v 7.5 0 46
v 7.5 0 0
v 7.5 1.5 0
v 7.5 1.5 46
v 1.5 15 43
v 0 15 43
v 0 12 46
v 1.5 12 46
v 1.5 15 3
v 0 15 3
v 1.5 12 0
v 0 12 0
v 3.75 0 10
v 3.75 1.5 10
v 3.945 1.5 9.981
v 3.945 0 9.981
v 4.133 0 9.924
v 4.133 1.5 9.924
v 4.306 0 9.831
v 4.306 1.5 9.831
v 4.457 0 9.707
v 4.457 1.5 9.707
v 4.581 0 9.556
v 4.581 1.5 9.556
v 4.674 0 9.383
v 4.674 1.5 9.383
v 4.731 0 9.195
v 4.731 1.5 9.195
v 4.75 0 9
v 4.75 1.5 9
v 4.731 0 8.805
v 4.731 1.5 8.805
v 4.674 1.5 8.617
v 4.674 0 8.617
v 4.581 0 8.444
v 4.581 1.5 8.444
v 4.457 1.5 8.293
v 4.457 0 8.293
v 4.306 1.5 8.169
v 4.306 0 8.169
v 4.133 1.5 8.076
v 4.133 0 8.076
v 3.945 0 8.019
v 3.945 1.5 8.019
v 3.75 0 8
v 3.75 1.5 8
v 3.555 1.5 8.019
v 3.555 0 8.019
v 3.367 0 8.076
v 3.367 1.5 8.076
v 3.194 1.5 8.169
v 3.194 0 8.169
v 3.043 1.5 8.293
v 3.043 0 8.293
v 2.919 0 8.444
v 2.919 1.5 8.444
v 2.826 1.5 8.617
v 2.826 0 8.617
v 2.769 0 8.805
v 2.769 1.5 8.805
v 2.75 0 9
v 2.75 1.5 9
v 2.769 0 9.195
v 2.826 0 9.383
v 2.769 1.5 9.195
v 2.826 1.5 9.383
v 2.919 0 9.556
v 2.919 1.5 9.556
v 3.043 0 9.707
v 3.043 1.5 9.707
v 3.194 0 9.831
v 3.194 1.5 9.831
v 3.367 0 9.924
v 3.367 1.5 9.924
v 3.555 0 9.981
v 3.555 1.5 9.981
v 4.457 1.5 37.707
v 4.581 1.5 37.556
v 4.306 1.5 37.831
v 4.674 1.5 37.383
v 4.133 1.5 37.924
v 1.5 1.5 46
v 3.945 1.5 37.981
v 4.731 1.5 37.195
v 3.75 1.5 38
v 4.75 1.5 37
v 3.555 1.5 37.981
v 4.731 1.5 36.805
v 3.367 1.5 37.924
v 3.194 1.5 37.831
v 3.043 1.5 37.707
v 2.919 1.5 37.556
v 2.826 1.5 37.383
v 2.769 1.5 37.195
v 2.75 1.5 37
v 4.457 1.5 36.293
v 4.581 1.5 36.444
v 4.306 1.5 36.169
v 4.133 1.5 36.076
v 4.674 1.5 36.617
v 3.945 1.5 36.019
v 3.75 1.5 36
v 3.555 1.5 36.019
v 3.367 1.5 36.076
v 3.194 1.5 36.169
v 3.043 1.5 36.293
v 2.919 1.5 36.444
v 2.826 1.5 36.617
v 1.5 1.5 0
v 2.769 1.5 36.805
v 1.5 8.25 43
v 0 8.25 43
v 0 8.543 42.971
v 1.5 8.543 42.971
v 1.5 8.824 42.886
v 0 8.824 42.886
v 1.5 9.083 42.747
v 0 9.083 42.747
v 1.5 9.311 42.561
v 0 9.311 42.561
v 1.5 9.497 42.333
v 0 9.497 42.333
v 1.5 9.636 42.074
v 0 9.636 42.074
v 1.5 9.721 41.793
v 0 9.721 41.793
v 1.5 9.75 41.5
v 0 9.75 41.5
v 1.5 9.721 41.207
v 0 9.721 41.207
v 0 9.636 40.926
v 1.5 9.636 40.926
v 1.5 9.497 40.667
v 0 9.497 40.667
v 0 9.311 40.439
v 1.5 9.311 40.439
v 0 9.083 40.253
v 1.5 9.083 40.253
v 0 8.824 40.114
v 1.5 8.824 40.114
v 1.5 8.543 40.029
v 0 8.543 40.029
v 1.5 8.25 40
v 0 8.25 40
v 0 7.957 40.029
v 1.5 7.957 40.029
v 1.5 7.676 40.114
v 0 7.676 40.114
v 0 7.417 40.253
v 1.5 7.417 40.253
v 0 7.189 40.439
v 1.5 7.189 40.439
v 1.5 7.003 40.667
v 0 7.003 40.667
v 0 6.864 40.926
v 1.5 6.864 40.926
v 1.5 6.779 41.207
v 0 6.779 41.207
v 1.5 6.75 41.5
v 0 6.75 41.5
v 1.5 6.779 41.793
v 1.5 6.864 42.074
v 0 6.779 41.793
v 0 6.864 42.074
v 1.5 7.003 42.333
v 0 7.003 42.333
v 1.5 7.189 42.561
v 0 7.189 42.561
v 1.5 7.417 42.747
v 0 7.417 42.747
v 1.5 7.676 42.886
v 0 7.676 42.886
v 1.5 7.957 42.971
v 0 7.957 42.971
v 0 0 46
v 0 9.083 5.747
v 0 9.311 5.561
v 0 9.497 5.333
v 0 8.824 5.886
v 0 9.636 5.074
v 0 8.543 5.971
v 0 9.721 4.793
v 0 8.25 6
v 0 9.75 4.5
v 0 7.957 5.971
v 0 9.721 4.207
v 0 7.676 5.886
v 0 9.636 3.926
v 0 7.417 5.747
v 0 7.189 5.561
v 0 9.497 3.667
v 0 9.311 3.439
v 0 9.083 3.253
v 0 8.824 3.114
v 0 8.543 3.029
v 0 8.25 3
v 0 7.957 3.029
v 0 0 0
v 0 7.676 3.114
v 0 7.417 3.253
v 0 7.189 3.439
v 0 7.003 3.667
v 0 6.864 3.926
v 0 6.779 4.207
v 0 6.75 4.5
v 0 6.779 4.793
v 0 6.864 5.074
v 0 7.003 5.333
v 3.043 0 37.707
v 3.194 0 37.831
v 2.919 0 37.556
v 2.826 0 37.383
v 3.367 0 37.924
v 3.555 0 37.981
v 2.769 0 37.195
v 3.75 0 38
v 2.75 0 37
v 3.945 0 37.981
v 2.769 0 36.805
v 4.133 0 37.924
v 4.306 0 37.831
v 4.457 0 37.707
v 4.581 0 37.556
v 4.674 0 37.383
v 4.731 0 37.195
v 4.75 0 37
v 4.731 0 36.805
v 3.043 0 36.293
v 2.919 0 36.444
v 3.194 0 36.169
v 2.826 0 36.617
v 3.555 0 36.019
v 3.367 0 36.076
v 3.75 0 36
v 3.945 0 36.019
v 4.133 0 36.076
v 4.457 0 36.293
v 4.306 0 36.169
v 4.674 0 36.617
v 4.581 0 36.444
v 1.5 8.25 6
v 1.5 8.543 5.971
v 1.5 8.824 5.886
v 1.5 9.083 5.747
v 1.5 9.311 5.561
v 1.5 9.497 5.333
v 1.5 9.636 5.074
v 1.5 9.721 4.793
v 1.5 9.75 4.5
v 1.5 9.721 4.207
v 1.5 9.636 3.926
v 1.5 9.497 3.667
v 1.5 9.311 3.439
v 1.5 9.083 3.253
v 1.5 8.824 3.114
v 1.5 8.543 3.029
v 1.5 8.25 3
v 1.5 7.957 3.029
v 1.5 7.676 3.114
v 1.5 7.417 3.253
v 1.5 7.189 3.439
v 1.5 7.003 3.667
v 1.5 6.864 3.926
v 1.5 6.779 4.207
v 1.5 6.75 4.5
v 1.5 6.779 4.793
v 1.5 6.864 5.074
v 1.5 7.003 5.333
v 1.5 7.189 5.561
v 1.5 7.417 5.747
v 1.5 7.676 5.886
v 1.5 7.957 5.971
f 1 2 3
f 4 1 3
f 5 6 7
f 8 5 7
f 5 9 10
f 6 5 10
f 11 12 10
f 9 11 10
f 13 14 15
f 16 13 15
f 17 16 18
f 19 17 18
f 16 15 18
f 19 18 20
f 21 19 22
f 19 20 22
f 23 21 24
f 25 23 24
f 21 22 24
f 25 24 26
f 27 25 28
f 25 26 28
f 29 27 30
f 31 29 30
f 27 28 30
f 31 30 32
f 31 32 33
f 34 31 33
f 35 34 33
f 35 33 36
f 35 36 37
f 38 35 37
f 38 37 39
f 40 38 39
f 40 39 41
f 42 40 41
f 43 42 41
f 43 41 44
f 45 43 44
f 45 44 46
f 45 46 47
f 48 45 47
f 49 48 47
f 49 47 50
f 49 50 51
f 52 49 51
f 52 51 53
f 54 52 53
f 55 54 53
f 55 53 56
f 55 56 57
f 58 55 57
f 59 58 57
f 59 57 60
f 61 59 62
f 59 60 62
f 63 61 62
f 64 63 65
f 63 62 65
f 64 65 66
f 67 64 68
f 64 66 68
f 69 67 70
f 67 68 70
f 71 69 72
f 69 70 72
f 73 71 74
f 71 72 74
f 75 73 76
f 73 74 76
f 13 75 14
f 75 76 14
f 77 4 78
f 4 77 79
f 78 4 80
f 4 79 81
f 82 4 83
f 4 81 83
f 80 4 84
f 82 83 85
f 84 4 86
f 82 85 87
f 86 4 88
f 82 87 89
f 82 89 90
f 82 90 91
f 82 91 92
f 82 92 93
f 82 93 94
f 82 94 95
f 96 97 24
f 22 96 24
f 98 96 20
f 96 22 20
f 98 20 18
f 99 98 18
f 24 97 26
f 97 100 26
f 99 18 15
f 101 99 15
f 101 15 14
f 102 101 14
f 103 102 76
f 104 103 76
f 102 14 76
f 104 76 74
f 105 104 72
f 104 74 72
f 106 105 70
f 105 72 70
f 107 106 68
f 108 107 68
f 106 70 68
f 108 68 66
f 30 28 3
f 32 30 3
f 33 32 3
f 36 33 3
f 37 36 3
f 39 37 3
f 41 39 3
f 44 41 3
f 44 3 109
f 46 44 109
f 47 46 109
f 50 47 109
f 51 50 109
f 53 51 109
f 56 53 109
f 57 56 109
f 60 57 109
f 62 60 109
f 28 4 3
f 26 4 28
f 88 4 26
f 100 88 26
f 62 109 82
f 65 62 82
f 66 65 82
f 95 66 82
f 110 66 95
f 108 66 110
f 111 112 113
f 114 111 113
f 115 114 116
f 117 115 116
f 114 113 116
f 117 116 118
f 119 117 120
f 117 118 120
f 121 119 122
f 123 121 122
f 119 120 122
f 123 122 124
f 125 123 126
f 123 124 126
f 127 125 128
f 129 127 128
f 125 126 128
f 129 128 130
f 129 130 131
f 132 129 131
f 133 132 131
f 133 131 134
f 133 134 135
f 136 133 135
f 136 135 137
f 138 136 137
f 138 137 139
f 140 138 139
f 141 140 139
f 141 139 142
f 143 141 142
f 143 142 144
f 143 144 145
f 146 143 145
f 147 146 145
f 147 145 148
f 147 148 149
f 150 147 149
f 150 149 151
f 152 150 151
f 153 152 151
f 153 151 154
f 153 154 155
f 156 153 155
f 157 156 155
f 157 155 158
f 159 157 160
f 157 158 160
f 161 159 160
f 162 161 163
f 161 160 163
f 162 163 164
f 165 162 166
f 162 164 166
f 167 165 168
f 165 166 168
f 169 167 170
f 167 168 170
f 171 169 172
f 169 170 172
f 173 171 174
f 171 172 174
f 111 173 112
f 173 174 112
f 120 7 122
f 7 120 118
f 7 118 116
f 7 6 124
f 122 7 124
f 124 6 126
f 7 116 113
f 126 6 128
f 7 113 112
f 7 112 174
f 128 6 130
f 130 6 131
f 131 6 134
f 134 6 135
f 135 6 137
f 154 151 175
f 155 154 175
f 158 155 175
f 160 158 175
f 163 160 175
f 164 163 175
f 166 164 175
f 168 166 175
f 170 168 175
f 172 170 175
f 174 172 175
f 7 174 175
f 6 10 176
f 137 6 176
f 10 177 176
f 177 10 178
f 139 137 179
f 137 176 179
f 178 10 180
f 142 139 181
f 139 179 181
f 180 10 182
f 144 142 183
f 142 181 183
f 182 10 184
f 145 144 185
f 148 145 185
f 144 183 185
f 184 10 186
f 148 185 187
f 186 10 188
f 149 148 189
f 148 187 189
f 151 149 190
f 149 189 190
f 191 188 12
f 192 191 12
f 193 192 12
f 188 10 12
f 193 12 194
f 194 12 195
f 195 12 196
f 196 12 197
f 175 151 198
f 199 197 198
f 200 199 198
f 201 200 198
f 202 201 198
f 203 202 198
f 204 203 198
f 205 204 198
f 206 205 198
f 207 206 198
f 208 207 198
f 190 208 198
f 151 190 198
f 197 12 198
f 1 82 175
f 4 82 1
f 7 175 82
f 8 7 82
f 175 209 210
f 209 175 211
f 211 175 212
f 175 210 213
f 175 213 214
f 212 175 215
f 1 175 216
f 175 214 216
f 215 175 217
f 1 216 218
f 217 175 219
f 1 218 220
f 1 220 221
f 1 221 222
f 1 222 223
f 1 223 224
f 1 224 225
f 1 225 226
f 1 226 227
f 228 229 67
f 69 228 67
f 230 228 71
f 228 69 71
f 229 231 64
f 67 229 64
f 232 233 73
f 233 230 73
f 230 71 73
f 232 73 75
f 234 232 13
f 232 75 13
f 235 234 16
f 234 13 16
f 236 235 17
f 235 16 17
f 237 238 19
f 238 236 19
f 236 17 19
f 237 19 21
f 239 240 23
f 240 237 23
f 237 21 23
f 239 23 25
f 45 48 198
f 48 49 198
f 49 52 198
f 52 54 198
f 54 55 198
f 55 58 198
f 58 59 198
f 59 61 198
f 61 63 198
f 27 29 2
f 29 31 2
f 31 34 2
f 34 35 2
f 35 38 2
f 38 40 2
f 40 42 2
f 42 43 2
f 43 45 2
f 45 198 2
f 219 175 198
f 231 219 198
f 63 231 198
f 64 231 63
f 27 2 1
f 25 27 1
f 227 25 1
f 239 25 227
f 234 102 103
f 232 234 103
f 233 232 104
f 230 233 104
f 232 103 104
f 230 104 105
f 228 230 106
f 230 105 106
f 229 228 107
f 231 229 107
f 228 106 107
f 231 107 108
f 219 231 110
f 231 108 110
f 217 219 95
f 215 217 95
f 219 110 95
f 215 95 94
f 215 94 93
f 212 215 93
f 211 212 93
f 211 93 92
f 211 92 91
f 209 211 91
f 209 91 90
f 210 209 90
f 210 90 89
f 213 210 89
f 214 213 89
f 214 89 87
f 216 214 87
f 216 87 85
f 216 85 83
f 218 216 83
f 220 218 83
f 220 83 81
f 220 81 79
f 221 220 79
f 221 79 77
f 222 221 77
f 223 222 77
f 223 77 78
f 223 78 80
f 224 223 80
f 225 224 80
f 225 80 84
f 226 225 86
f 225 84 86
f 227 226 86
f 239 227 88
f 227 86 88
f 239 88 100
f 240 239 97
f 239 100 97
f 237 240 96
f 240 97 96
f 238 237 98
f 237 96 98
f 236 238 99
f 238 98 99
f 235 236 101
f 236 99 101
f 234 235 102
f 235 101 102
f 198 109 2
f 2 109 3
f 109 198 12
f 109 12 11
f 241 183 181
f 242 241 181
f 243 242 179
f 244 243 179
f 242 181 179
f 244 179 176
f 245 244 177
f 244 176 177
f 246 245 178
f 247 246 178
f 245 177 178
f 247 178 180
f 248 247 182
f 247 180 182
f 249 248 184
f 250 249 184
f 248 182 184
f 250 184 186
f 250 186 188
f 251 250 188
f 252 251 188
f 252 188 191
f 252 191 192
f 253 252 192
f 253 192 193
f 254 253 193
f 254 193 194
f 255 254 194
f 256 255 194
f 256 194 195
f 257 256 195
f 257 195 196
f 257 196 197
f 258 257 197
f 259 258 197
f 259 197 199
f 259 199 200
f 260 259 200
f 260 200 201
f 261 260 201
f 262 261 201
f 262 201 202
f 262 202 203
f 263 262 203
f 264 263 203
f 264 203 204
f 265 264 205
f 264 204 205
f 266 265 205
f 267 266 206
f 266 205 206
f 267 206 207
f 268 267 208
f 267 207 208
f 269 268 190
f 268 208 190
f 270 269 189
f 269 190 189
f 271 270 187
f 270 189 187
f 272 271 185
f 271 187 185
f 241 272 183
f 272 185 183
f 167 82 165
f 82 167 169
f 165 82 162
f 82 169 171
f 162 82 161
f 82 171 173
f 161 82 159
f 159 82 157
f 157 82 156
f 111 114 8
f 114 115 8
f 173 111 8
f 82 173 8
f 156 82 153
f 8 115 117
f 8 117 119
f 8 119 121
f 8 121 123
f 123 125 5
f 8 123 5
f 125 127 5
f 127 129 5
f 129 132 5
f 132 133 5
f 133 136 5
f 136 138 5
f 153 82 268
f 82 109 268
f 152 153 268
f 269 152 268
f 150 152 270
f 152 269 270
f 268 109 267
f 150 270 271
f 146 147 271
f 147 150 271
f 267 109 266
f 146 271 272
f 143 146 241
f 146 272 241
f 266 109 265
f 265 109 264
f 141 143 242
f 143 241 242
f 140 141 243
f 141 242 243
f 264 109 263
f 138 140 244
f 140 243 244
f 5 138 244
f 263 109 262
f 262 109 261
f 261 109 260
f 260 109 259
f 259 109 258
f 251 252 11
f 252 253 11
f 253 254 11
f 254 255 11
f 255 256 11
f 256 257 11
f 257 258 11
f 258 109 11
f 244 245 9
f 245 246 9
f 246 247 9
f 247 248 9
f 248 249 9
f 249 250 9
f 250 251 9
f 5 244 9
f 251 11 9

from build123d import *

# Parameters (mm, degrees)
EXTRUDE_THIN1_DEPTH = 46
SKETCH2_R           = 1
CUT_EXTRUDE1_DEPTH  = 49.523190332
SKETCH3_R           = 1.5
CUT_EXTRUDE2_DEPTH  = 49.961719741
CUT_EXTRUDE3_DEPTH  = 49.961719741


with BuildPart() as part:
    # Sketch1 → Extrude-Thin1 (new body)
    with BuildSketch(Plane.XY):
        Polygon((0, 15), (0, 0), (7.5, 0), (7.5, 1.5), (1.5, 1.5), (1.5, 15), align=None)
    extrude(amount=EXTRUDE_THIN1_DEPTH)

    # Sketch2 → Cut-Extrude1 (cut, through all)
    with BuildSketch(Plane(origin=(0, 1.5, 0), x_dir=(1, 0, 0), z_dir=(0, 1, 0))):
        with Locations(Location((3.75, -9, 0), (0, 0, 270))):
            Circle(SKETCH2_R)
        with Locations(Location((3.75, -37, 0), (0, 0, 90))):
            Circle(SKETCH2_R)
    extrude(amount=-CUT_EXTRUDE1_DEPTH, mode=Mode.SUBTRACT)

    # Sketch3 → Cut-Extrude2 (cut, through all)
    with BuildSketch(Plane.ZY):
        with Locations((41.5, 8.25)):
            Circle(SKETCH3_R)
        with Locations((4.5, 8.25)):
            Circle(SKETCH3_R)
    extrude(amount=-CUT_EXTRUDE2_DEPTH, mode=Mode.SUBTRACT)

    # Sketch4 → Cut-Extrude3 (cut, through all)
    with BuildSketch(Plane.ZY):
        Polygon((0, 12), (3, 15), (0, 15), align=None)
        Polygon((46, 15), (43, 15), (46, 12), align=None)
    extrude(amount=-CUT_EXTRUDE3_DEPTH, mode=Mode.SUBTRACT)


solid = part.part
